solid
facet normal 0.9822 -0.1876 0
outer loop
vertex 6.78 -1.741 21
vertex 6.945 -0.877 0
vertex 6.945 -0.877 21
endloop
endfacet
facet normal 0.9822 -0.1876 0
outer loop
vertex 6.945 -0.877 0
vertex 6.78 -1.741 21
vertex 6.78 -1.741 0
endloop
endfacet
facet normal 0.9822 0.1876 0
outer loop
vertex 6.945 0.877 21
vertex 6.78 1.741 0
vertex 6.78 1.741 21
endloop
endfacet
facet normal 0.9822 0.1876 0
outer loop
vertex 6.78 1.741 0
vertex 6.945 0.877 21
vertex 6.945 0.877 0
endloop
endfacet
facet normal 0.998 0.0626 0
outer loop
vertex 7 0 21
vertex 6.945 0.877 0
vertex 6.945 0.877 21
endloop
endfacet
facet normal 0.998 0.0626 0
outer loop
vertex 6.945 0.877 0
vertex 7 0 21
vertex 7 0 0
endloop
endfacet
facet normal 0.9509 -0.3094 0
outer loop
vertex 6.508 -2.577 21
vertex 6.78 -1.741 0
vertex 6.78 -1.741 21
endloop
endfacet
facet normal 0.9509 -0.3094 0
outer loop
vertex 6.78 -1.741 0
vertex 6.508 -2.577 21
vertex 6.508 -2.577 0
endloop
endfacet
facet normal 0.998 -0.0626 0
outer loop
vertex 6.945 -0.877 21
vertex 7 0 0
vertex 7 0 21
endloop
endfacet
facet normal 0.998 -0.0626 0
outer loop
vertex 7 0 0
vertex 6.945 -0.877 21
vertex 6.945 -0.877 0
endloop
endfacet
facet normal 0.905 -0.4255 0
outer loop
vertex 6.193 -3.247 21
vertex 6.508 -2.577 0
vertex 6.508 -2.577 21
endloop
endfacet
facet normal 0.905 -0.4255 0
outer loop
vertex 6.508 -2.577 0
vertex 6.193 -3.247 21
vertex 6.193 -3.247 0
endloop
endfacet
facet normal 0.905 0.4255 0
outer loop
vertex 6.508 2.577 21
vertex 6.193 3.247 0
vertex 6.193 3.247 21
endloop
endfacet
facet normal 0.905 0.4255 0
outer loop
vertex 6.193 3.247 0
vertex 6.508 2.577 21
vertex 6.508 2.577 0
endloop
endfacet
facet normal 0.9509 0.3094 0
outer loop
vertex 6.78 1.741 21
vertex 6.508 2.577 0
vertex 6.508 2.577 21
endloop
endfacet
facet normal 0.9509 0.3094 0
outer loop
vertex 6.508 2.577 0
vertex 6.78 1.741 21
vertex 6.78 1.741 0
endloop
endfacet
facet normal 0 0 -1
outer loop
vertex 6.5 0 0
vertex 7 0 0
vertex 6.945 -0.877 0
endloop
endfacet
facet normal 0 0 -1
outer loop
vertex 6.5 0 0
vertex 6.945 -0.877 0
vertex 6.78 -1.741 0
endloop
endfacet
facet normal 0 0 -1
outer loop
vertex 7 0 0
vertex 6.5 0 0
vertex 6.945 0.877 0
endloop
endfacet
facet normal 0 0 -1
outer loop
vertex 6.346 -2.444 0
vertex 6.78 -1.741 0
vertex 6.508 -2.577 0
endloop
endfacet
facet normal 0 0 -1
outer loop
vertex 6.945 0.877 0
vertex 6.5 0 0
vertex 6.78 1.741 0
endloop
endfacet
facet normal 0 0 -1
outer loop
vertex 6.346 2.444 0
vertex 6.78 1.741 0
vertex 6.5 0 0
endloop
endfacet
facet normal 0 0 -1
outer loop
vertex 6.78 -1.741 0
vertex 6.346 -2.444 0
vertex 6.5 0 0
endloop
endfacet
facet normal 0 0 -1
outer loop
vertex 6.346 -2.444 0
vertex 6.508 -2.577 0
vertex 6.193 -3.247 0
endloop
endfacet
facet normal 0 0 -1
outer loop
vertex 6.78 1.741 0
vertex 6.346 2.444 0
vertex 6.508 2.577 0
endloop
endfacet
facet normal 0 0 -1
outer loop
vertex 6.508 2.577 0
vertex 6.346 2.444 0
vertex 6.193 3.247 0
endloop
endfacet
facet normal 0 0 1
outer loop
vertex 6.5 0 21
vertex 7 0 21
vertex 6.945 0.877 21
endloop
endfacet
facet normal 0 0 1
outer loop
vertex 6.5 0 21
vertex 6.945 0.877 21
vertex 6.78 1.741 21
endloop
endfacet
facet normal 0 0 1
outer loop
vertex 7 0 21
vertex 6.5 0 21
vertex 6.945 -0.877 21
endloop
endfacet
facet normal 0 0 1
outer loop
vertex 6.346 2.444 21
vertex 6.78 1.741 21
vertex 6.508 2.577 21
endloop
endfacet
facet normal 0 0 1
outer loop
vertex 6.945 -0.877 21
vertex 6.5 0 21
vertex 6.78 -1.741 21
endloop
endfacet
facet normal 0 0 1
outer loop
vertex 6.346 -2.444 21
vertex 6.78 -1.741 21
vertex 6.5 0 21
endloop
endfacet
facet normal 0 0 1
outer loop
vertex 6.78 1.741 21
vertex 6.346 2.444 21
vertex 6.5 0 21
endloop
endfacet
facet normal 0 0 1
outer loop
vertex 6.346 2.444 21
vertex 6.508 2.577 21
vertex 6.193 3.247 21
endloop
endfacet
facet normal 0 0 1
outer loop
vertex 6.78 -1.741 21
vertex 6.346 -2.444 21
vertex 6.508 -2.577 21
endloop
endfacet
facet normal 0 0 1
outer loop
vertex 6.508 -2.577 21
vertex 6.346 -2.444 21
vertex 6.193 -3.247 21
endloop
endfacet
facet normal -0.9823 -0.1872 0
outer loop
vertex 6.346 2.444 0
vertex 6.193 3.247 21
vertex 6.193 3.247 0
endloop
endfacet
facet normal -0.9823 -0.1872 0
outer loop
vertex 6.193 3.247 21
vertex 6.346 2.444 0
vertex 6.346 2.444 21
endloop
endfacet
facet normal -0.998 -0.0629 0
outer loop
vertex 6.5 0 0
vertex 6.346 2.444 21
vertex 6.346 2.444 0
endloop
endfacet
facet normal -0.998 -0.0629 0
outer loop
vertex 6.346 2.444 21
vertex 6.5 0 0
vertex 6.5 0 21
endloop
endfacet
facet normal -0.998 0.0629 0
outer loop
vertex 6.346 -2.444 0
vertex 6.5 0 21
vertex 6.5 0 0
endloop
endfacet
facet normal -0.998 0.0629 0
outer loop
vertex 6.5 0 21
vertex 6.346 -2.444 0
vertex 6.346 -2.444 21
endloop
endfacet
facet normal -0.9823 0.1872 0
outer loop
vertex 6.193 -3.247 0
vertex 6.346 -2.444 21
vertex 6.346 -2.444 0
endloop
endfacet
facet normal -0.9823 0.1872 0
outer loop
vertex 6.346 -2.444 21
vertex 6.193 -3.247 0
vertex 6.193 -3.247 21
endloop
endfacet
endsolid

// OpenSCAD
$fn = 50;


difference() {
	union() {
		cylinder(h = 21, r = 7.0000000000);
		translate(v = [-16.0000000000, 0, 0]) {
			cylinder(h = 21, r = 7.0000000000);
		}
	}
	union() {
		cylinder(h = 21, r = 3.2500000000);
		cylinder(h = 21, r = 1.8000000000);
		cylinder(h = 21, r = 1.8000000000);
		cylinder(h = 21, r = 1.8000000000);
		translate(v = [-20.5000000000, 0, 0]) {
			hull() {
				translate(v = [-3.7500000000, 0.0000000000, 0]) {
					cylinder(h = 21, r = 10.5000000000);
				}
				translate(v = [3.7500000000, 0.0000000000, 0]) {
					cylinder(h = 21, r = 10.5000000000);
				}
				translate(v = [-3.7500000000, -0.0000000000, 0]) {
					cylinder(h = 21, r = 10.5000000000);
				}
				translate(v = [3.7500000000, -0.0000000000, 0]) {
					cylinder(h = 21, r = 10.5000000000);
				}
			}
		}
		translate(v = [-13.0000000000, 0, 0.0000000000]) {
			cylinder(h = 21, r = 19.5000000000);
		}
	}
}
